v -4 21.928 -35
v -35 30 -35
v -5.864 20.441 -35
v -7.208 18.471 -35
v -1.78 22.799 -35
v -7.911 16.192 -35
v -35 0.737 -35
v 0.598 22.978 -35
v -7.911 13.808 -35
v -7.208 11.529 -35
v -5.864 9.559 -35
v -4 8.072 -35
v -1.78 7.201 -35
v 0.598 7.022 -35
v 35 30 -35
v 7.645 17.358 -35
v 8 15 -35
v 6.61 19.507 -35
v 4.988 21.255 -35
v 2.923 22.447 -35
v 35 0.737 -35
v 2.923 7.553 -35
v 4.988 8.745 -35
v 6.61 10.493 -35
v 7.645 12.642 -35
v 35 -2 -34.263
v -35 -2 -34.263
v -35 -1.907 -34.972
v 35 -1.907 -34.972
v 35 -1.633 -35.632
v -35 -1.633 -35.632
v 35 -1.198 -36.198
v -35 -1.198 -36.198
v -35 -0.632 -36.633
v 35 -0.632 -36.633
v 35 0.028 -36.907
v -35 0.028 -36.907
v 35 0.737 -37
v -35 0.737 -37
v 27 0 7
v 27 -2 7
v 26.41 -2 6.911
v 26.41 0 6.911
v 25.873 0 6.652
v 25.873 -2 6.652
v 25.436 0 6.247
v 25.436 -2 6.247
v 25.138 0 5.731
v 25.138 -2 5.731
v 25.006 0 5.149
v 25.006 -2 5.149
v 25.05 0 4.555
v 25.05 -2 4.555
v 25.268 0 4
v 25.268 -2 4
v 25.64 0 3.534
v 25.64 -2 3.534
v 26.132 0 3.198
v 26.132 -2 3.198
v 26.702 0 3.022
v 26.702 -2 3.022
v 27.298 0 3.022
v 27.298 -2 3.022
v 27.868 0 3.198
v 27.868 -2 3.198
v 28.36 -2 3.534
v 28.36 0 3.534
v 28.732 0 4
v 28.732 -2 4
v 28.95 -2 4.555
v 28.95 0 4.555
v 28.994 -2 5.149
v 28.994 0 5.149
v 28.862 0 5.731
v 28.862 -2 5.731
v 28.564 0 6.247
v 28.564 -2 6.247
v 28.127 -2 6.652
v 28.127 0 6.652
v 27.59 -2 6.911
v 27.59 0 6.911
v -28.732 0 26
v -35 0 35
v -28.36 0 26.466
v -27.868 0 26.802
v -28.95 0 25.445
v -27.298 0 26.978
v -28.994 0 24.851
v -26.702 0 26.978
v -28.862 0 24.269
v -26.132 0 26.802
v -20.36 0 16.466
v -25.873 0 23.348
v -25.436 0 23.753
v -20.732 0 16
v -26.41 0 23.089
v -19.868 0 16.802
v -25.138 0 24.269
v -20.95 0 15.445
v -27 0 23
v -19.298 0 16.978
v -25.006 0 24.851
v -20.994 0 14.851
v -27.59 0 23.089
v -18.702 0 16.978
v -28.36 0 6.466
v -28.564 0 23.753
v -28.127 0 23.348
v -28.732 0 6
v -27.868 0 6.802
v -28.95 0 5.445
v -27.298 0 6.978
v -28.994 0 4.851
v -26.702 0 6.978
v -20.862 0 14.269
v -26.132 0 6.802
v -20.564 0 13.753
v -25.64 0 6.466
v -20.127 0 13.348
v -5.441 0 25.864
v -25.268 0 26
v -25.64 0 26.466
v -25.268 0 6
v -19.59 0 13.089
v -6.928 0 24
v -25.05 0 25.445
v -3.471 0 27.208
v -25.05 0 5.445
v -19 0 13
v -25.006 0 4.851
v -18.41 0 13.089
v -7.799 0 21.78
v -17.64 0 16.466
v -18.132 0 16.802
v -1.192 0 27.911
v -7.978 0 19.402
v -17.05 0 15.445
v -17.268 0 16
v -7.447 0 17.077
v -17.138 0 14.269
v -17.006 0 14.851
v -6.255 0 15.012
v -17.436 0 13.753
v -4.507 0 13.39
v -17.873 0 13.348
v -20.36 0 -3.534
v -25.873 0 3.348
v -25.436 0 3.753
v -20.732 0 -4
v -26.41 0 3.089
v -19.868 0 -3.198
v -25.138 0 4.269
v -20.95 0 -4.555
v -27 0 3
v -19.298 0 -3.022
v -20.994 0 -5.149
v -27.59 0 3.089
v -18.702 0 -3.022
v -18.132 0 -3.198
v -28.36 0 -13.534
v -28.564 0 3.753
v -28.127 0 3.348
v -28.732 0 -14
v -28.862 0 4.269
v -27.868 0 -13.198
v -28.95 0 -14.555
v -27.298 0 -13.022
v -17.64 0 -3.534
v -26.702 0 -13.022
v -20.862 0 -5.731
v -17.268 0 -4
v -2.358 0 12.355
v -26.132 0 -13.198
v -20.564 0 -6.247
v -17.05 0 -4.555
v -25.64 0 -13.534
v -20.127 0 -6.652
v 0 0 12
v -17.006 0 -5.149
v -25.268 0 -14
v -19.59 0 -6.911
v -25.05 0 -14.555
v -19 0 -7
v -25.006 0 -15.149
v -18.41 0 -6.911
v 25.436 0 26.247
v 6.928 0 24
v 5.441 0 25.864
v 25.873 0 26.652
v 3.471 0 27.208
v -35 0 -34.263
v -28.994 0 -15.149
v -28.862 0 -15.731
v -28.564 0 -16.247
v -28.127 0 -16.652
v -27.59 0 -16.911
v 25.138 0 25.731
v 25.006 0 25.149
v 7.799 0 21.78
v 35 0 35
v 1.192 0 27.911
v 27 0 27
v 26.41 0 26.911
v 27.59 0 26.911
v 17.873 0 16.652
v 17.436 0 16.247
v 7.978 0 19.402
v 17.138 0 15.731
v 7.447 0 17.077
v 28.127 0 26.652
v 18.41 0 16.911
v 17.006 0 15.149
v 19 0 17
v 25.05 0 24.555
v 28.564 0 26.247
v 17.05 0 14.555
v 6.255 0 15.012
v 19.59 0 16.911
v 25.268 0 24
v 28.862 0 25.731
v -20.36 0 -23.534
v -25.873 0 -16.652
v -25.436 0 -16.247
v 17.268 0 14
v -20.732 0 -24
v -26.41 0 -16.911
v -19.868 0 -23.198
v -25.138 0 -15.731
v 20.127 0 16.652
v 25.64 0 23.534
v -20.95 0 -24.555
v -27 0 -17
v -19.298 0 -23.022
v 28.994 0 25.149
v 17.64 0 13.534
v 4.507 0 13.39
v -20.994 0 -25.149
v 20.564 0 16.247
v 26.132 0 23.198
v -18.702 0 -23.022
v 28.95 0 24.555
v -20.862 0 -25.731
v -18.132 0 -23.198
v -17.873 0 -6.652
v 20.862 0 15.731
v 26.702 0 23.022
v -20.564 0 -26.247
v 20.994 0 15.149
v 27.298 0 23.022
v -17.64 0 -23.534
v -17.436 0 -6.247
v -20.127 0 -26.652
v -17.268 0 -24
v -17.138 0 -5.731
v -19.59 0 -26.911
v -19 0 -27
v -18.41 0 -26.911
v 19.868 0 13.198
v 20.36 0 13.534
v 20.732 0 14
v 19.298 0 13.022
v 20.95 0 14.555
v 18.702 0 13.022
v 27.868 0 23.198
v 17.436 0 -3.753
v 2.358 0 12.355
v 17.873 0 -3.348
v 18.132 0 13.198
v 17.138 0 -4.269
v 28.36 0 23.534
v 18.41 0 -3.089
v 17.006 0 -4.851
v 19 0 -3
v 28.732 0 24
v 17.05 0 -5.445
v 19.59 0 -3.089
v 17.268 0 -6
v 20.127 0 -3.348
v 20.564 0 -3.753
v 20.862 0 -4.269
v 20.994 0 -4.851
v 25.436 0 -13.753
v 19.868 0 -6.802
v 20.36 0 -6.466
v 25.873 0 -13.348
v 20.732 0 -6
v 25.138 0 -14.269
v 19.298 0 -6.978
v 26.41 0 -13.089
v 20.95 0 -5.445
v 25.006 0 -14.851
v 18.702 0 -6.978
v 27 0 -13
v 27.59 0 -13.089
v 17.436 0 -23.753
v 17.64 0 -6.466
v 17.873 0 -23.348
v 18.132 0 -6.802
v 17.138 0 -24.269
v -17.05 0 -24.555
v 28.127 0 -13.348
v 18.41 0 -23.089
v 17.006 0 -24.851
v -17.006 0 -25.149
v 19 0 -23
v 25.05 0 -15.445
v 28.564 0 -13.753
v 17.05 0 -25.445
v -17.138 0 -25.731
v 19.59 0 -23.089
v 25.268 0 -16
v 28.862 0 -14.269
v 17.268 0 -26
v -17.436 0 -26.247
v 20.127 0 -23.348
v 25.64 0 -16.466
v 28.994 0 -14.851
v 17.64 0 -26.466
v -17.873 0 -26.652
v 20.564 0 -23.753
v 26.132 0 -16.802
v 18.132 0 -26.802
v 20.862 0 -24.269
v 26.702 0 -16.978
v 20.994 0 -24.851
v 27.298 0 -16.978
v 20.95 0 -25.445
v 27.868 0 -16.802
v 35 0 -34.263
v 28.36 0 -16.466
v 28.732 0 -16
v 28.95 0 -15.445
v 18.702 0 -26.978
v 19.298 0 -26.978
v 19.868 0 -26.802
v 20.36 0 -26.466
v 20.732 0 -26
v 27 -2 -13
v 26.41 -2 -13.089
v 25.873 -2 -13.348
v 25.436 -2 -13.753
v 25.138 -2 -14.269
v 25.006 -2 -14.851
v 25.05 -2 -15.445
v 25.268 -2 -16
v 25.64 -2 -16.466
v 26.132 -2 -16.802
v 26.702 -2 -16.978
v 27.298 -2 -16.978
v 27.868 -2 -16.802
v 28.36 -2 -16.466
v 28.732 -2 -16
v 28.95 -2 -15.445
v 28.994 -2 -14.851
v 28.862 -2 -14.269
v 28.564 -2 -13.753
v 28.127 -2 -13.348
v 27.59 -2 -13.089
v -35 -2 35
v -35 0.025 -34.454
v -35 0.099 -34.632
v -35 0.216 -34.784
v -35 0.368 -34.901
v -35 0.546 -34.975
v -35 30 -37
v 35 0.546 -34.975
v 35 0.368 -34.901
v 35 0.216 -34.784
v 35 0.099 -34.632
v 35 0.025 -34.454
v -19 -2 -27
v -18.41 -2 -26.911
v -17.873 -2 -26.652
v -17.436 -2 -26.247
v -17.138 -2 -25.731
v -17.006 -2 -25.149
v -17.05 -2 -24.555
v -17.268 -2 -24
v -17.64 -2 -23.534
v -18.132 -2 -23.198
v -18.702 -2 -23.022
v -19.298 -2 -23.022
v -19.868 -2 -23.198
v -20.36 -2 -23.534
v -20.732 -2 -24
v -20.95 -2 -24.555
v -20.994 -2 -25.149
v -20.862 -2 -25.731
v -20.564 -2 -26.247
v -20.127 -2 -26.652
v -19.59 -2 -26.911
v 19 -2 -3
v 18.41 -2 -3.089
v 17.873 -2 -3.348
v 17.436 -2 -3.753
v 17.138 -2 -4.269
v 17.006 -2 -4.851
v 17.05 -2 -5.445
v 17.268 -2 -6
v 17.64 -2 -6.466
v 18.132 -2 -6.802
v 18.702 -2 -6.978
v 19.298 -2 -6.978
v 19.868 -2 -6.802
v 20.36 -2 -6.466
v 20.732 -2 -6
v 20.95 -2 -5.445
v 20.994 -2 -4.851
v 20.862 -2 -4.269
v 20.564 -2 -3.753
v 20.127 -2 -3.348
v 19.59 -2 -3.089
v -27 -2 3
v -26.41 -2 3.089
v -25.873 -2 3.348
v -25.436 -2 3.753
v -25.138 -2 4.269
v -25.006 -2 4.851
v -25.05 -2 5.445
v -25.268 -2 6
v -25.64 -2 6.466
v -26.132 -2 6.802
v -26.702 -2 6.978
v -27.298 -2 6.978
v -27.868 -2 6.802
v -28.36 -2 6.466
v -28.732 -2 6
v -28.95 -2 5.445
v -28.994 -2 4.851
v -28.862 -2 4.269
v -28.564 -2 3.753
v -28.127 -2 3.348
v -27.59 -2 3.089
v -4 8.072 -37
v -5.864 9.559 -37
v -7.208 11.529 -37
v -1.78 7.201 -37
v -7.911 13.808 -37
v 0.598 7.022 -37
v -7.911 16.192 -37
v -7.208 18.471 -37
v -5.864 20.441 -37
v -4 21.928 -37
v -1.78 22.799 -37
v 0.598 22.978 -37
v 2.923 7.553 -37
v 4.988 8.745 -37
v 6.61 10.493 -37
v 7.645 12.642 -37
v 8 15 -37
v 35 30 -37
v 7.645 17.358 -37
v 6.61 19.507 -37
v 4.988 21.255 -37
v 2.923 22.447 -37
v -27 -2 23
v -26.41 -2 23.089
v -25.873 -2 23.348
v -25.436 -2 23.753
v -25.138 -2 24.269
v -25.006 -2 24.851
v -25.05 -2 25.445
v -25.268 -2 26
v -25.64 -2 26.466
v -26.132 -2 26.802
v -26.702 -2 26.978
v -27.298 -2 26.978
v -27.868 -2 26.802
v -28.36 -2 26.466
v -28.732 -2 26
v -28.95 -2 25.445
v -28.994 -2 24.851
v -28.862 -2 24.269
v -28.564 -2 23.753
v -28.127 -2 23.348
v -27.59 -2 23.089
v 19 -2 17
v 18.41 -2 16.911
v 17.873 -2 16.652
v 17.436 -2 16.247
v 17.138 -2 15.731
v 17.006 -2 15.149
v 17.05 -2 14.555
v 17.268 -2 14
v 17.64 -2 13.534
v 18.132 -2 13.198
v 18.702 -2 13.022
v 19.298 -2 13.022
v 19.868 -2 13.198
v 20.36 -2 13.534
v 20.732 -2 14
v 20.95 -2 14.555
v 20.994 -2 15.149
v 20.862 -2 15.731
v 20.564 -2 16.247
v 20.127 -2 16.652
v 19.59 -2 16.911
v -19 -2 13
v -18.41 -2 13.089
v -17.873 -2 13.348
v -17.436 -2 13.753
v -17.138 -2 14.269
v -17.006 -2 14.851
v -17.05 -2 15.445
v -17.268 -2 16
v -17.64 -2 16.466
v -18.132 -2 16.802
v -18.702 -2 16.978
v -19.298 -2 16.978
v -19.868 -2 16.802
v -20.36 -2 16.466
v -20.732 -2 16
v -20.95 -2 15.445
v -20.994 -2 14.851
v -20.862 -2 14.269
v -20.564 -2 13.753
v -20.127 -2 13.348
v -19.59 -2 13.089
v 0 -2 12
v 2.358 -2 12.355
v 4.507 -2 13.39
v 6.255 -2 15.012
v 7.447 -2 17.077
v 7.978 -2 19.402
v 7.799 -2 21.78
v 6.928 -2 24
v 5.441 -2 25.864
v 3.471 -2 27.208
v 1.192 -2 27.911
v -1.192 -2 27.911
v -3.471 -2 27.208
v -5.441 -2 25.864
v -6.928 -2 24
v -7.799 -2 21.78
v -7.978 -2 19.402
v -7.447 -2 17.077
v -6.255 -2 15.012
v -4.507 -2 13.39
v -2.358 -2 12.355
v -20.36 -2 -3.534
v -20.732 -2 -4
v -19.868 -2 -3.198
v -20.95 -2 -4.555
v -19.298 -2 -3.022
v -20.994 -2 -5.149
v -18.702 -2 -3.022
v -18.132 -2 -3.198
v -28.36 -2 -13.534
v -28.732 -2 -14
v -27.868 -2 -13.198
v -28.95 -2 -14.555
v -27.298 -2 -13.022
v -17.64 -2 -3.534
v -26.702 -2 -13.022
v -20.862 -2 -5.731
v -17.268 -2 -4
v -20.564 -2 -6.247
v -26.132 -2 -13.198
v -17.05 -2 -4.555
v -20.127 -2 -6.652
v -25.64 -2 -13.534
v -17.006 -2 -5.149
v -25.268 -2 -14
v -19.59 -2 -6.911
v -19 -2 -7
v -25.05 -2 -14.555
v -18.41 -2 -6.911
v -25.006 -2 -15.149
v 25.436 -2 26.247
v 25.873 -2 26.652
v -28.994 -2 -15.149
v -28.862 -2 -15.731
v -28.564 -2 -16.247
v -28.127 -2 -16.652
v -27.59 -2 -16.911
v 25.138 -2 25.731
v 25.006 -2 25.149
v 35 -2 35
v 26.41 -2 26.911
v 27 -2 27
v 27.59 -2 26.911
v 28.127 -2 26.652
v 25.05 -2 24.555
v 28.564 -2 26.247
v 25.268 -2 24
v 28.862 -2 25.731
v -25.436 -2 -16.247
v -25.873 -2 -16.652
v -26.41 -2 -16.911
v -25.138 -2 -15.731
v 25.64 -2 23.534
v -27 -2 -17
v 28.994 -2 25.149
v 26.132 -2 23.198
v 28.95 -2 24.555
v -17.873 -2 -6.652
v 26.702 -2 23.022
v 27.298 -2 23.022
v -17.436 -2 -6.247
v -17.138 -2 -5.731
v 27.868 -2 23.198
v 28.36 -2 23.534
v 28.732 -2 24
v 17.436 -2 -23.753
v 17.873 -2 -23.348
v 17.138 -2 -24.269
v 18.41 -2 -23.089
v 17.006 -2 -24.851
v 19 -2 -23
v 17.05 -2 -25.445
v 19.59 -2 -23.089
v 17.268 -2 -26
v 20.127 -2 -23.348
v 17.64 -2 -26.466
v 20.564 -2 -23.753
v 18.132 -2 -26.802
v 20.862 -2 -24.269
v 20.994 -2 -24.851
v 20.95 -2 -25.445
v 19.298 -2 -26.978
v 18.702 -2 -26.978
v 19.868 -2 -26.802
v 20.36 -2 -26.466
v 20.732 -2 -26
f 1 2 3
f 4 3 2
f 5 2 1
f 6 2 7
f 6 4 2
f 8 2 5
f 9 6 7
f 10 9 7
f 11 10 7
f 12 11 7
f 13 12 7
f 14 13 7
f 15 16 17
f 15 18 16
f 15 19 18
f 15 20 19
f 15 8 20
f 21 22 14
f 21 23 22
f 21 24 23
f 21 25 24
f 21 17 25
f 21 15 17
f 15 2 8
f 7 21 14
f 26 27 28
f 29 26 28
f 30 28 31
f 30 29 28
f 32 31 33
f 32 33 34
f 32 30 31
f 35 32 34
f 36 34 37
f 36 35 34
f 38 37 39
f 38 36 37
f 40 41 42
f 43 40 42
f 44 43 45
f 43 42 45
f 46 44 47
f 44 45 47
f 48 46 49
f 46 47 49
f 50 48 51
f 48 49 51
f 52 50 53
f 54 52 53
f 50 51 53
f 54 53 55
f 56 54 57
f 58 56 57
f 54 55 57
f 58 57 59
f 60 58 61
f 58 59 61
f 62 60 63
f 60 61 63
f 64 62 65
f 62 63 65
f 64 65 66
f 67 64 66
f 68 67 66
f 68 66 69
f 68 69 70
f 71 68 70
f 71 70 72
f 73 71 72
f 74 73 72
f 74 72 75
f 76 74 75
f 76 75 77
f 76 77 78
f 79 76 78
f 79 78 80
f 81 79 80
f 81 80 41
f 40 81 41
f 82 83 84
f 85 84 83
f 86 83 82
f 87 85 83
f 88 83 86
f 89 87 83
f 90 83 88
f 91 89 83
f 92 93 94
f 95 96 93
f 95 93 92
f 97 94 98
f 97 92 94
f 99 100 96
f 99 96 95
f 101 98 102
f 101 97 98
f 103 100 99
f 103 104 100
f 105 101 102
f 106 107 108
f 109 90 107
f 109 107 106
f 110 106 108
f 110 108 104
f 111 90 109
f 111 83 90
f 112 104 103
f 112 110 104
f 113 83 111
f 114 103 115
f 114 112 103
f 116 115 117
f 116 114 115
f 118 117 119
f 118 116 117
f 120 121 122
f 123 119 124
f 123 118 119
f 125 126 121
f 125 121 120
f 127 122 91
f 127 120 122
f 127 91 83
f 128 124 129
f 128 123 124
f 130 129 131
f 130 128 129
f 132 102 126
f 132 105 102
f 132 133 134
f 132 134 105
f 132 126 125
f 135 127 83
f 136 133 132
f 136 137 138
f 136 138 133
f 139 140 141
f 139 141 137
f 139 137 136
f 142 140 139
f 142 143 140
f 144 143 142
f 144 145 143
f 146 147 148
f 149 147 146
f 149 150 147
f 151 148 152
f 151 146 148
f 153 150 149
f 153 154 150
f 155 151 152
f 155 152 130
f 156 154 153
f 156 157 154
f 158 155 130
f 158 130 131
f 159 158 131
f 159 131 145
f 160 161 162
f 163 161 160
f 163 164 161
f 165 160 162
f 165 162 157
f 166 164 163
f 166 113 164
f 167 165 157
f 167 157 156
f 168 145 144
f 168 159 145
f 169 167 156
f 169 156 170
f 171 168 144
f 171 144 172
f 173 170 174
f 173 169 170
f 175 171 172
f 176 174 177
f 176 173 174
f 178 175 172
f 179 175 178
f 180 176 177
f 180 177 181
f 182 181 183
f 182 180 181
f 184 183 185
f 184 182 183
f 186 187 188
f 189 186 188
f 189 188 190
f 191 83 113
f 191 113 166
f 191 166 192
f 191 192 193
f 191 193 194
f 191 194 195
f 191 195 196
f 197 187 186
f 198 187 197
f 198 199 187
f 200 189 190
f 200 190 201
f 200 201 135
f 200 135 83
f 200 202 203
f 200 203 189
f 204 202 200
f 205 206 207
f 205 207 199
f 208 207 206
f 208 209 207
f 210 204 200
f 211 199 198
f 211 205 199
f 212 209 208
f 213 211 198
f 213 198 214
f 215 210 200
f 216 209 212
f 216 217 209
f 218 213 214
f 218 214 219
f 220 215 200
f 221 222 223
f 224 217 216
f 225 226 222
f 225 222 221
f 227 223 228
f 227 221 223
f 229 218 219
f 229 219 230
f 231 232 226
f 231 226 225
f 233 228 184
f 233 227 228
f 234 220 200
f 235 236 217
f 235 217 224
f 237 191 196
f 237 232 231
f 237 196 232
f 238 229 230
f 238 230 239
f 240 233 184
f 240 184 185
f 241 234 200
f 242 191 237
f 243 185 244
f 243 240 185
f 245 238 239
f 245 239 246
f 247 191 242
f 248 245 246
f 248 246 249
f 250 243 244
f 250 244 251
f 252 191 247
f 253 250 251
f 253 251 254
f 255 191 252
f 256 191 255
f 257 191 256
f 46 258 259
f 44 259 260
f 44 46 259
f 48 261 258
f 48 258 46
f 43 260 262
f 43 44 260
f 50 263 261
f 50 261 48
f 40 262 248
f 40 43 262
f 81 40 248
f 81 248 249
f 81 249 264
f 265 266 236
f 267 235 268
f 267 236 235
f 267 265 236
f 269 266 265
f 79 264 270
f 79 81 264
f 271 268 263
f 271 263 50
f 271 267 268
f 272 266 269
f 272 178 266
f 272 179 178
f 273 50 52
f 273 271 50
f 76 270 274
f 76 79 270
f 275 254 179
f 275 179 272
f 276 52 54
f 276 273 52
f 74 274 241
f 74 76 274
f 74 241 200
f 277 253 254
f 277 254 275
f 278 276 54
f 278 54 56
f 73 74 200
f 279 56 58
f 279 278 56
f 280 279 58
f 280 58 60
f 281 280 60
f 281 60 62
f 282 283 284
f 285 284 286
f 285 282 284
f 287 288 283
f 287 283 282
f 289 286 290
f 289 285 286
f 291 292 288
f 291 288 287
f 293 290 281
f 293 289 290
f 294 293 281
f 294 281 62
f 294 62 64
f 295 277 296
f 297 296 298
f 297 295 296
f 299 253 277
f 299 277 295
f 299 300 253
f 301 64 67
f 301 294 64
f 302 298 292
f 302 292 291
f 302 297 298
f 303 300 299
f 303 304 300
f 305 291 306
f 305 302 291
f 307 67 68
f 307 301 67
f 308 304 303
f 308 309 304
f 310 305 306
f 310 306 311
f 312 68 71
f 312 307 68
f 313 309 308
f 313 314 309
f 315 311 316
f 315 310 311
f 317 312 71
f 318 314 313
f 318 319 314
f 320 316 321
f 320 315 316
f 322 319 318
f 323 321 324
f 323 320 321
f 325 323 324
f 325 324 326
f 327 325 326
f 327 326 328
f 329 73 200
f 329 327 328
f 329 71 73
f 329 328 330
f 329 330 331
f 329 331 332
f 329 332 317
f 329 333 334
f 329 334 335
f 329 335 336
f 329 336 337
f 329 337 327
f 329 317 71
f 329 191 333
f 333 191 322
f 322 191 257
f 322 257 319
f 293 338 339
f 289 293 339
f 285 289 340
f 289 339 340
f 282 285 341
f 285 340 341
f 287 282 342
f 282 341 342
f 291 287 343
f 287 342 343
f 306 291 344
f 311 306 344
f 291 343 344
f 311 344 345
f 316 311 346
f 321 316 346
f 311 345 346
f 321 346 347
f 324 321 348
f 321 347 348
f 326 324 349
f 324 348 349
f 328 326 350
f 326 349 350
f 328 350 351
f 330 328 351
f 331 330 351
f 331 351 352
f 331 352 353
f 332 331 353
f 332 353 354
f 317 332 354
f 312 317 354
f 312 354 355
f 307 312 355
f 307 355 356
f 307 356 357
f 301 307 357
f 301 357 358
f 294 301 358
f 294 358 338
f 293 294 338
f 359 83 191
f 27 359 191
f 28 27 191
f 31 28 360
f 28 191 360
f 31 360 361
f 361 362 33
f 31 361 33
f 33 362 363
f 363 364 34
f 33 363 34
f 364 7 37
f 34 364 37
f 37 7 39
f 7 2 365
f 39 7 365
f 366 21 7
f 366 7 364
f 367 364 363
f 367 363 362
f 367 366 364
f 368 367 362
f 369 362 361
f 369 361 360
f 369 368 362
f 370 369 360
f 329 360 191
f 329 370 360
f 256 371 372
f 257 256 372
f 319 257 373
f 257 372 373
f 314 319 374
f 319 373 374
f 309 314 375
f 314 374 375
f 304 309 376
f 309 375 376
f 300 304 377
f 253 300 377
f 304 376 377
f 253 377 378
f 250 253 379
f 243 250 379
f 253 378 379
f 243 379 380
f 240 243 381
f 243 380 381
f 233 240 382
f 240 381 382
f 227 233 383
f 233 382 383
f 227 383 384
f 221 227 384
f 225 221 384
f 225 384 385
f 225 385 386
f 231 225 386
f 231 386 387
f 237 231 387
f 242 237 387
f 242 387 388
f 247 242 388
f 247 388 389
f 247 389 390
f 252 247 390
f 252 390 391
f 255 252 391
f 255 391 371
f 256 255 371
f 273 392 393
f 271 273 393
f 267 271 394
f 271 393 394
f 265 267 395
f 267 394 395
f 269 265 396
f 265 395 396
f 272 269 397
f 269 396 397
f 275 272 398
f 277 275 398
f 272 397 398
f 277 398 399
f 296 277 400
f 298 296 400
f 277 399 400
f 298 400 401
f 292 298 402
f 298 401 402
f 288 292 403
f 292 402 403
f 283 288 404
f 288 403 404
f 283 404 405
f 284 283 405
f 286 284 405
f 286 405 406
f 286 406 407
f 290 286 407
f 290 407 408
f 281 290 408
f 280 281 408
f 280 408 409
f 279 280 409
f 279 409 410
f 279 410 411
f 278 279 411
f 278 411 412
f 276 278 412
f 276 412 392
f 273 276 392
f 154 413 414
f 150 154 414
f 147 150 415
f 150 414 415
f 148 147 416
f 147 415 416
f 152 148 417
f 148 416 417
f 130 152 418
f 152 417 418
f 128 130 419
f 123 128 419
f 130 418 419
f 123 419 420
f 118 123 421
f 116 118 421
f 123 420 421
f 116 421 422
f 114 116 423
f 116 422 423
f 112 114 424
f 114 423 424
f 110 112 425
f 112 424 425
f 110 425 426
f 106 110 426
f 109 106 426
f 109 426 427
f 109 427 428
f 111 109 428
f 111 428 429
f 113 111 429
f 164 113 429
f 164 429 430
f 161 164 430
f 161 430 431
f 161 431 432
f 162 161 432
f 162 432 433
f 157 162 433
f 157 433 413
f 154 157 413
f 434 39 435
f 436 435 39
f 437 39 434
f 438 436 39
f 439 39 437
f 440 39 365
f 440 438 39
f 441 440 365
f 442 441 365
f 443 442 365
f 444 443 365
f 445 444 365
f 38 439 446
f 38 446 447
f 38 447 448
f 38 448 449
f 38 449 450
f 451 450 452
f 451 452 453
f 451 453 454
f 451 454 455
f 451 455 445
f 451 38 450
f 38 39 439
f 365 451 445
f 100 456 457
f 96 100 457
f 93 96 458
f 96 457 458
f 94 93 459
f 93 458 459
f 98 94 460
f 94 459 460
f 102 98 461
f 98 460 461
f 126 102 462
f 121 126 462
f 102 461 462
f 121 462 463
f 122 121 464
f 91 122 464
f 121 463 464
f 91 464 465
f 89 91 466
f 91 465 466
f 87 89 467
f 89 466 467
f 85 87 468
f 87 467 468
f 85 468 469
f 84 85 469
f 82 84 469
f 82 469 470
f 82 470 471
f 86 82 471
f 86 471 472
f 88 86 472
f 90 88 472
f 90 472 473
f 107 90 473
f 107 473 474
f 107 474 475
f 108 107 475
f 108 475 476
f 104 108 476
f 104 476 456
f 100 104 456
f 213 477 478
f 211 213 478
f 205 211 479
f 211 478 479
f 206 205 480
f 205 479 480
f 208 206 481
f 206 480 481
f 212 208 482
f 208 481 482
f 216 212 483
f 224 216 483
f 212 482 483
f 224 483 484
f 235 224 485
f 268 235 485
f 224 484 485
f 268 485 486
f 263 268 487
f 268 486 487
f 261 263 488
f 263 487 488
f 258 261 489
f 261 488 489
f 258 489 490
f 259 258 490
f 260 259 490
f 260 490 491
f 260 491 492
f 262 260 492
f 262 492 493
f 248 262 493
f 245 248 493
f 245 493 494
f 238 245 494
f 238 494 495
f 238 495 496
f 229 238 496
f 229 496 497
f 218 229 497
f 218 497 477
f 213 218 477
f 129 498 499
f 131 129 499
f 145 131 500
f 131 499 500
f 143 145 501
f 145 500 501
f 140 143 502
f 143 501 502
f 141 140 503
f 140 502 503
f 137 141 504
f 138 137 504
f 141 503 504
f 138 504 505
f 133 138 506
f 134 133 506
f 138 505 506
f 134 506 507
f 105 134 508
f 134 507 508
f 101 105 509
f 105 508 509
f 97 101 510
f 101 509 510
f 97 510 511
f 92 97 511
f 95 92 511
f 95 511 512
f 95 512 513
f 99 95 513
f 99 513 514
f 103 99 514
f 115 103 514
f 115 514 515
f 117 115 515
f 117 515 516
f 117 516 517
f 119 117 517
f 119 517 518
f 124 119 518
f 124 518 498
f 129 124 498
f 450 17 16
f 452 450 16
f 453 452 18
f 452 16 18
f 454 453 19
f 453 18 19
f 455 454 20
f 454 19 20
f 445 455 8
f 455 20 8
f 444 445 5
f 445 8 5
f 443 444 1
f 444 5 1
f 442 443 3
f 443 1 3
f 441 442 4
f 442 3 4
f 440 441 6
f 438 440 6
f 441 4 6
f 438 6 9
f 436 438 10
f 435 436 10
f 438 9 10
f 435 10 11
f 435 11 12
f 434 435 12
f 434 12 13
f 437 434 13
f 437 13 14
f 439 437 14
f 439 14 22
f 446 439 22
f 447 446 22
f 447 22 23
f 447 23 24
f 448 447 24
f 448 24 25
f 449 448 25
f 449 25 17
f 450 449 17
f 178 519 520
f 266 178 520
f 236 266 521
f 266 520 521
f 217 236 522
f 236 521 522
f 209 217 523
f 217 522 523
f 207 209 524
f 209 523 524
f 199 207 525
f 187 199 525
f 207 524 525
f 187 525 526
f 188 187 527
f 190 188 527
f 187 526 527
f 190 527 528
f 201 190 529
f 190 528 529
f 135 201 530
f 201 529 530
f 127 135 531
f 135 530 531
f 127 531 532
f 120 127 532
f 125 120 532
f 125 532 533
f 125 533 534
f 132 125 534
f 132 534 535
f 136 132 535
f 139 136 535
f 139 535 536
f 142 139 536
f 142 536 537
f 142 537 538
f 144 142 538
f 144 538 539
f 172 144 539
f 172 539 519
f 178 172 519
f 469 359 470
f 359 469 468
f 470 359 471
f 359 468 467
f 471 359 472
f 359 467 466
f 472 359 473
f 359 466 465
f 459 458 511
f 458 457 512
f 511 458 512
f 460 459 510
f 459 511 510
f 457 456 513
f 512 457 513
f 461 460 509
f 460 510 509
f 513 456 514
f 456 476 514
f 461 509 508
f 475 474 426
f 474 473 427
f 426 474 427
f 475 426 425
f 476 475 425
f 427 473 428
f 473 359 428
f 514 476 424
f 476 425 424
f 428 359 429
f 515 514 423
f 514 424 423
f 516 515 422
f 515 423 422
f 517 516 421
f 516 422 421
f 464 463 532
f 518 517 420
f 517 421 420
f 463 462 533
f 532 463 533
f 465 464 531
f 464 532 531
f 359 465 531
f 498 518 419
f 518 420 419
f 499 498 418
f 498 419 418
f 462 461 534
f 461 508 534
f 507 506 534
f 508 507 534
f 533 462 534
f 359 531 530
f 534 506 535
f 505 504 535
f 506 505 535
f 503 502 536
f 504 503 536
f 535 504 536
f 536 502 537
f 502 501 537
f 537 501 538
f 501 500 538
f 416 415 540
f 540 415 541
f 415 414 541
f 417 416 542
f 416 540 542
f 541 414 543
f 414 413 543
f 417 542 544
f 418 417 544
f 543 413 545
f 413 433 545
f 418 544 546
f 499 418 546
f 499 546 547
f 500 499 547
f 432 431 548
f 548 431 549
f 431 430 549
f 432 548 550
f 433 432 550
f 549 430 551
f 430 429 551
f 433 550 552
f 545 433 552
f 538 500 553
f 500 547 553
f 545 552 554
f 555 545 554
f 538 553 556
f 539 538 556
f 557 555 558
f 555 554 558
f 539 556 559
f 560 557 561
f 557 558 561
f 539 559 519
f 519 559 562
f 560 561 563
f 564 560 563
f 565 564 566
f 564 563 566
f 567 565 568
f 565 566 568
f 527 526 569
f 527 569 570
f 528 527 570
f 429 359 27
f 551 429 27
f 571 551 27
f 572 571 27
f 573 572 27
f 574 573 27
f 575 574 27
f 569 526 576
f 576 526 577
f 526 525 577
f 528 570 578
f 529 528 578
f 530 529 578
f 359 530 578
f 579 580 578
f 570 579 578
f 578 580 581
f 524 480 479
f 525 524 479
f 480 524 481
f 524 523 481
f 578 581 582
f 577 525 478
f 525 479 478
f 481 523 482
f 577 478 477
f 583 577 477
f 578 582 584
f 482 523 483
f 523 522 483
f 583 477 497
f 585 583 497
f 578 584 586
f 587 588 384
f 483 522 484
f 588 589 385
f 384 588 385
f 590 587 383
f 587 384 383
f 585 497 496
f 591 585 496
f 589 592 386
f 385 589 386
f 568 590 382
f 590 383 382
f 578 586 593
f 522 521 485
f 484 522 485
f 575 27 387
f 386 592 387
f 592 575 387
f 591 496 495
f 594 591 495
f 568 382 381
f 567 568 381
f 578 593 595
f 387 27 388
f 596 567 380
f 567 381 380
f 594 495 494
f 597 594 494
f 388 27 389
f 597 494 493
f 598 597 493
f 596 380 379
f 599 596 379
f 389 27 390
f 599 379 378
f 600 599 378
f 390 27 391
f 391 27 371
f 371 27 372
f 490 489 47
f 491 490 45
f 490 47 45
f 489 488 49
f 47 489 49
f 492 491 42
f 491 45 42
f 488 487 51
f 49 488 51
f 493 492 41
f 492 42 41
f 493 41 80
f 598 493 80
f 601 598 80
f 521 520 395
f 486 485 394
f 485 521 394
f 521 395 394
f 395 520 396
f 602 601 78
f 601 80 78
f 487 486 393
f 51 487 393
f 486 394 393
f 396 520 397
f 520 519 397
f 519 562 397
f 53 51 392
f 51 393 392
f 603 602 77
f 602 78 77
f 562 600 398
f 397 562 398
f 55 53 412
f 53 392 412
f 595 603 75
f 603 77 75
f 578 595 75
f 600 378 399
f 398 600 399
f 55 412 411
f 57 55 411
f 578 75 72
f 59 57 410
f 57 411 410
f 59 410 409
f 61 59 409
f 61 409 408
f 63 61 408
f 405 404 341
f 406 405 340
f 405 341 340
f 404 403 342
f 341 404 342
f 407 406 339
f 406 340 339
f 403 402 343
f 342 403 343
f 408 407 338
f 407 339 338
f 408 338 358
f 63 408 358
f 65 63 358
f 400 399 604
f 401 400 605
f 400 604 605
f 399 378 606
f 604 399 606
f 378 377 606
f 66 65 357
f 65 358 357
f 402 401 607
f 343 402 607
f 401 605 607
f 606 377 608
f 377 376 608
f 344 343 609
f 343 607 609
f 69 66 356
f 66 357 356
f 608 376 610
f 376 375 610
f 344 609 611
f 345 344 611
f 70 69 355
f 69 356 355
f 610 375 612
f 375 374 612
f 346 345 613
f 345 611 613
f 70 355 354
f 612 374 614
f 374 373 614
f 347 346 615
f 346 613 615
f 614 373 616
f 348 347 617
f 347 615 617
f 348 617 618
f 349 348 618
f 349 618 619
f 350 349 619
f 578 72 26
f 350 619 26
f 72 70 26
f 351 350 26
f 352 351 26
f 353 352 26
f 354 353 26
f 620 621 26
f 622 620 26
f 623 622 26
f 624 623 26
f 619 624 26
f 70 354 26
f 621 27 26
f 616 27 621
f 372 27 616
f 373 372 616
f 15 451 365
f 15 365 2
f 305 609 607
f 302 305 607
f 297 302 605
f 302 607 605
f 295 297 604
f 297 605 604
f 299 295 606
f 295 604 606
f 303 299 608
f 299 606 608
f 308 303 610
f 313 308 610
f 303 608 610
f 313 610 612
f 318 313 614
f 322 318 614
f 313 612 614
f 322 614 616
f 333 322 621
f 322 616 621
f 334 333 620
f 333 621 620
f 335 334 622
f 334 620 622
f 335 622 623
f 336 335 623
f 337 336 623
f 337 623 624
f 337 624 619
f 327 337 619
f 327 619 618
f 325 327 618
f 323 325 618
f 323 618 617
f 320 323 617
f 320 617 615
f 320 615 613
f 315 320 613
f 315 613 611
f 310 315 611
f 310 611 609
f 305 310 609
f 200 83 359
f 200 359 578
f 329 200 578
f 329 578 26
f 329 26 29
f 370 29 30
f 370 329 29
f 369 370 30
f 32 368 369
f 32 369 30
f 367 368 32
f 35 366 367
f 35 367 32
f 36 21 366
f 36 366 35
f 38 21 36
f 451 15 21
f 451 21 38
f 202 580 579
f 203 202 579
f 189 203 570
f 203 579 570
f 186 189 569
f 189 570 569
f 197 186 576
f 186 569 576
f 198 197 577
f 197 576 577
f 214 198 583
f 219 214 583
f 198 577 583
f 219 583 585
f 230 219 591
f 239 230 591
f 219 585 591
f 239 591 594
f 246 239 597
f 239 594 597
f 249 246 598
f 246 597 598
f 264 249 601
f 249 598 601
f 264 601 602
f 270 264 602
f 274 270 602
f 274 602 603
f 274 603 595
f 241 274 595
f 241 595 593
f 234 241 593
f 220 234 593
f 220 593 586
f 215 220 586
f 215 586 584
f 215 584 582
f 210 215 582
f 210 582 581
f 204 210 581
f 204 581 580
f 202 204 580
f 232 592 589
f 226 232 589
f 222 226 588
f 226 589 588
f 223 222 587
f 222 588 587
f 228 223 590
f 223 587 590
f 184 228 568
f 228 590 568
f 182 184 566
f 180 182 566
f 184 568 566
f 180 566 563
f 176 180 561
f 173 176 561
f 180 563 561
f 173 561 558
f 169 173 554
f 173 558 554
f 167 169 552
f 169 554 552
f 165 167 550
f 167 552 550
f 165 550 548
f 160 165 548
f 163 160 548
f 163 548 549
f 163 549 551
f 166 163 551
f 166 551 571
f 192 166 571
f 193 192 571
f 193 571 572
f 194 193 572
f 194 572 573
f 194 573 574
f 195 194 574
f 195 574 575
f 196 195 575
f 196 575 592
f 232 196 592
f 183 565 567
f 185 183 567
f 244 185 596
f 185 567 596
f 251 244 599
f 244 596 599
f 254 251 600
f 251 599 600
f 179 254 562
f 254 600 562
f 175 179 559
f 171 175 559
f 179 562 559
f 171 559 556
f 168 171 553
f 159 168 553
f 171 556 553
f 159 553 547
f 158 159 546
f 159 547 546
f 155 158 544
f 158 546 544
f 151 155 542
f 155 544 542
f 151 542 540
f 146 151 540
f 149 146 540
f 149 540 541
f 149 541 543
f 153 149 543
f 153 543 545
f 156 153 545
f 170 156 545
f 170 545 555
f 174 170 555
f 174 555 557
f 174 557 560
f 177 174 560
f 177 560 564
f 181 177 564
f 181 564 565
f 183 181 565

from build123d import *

# Parameters (mm, degrees)
SKETCH1_W                    = 70
SKETCH1_H                    = 70
BASE_FLANGE1_DEPTH           = 2
EDGE_FLANGE1_STRIP_W         = 9.4732
EDGE_FLANGE1_STRIP_H         = 2
EDGE_FLANGE1_STRIP_CUT_DEPTH = 70
EDGE_FLANGE1_DEPTH           = 70
SKETCH9_R                    = 8
CUT_EXTRUDE1_DEPTH           = 10
SKETCH11_R                   = 8
SKETCH11_R_2                 = 2
CUT_EXTRUDE2_DEPTH           = 10


# Sheet-metal steps are written as plain solids
with BuildPart() as part:
    # Sketch1 → Base-Flange1 (new body)
    with BuildSketch(Plane(origin=(0, 0, 0), x_dir=(1, 0, 0), z_dir=(0, 1, 0))):
        Rectangle(SKETCH1_W, SKETCH1_H)
    extrude(amount=-BASE_FLANGE1_DEPTH)

    # Edge-Flange1 strip (across the edge) → Edge-Flange1 strip cut (cut)
    with BuildSketch(Plane(origin=(35, 0, -35), x_dir=(0, 0, 1), z_dir=(-1, 0, 0))):
        with Locations((-4, -1)):
            Rectangle(EDGE_FLANGE1_STRIP_W, EDGE_FLANGE1_STRIP_H)
    extrude(amount=EDGE_FLANGE1_STRIP_CUT_DEPTH, mode=Mode.SUBTRACT)

    # Edge-Flange1 section (across the edge) → Edge-Flange1 (add)
    with BuildSketch(Plane(origin=(35, 0, -35), x_dir=(0, 0, 1), z_dir=(-1, 0, 0))):
        with BuildLine():
            Line((-2, 0.7366), (-2, 30))
            Line((-2, 30), (0, 30))
            Line((0, 30), (0, 0.7366))
            ThreePointArc((0, 0.7366), (0.215745145, 0.215745145), (0.7366, 0))
            Line((0.7366, 0), (0.7366, -2))
            ThreePointArc((0.7366, -2), (-1.198468417, -1.198468417), (-2, 0.7366))
        make_face()
    extrude(amount=EDGE_FLANGE1_DEPTH)

    # Sketch9 → Cut-Extrude1 (cut)
    with BuildSketch(Plane.XY.offset(-35)):
        with Locations((0, 15)):
            Circle(SKETCH9_R)
    extrude(amount=-CUT_EXTRUDE1_DEPTH, mode=Mode.SUBTRACT)

    # Sketch11 → Cut-Extrude2 (cut)
    with BuildSketch(Plane.XZ.offset(2)):
        with Locations(Location((0, 20, 0), (0, 0, 270))):
            Circle(SKETCH11_R)
        with Locations(Location((-27, 25, 0), (0, 0, 270))):
            Circle(SKETCH11_R_2)
        with Locations(Location((-19, 15, 0), (0, 0, 270))):
            Circle(SKETCH11_R_2)
        with Locations(Location((-27, 5, 0), (0, 0, 270))):
            Circle(SKETCH11_R_2)
        with Locations(Location((-19, -5, 0), (0, 0, 270))):
            Circle(SKETCH11_R_2)
        with Locations(Location((-27, -15, 0), (0, 0, 270))):
            Circle(SKETCH11_R_2)
        with Locations(Location((-19, -25, 0), (0, 0, 270))):
            Circle(SKETCH11_R_2)
        with Locations(Location((27, 5, 0), (0, 0, 90))):
            Circle(SKETCH11_R_2)
        with Locations(Location((19, 15, 0), (0, 0, 90))):
            Circle(SKETCH11_R_2)
        with Locations(Location((19, -25, 0), (0, 0, 90))):
            Circle(SKETCH11_R_2)
        with Locations(Location((27, -15, 0), (0, 0, 90))):
            Circle(SKETCH11_R_2)
        with Locations(Location((19, -5, 0), (0, 0, 90))):
            Circle(SKETCH11_R_2)
        with Locations(Location((27, 25, 0), (0, 0, 90))):
            Circle(SKETCH11_R_2)
    extrude(amount=-CUT_EXTRUDE2_DEPTH, mode=Mode.SUBTRACT)


solid = part.part
